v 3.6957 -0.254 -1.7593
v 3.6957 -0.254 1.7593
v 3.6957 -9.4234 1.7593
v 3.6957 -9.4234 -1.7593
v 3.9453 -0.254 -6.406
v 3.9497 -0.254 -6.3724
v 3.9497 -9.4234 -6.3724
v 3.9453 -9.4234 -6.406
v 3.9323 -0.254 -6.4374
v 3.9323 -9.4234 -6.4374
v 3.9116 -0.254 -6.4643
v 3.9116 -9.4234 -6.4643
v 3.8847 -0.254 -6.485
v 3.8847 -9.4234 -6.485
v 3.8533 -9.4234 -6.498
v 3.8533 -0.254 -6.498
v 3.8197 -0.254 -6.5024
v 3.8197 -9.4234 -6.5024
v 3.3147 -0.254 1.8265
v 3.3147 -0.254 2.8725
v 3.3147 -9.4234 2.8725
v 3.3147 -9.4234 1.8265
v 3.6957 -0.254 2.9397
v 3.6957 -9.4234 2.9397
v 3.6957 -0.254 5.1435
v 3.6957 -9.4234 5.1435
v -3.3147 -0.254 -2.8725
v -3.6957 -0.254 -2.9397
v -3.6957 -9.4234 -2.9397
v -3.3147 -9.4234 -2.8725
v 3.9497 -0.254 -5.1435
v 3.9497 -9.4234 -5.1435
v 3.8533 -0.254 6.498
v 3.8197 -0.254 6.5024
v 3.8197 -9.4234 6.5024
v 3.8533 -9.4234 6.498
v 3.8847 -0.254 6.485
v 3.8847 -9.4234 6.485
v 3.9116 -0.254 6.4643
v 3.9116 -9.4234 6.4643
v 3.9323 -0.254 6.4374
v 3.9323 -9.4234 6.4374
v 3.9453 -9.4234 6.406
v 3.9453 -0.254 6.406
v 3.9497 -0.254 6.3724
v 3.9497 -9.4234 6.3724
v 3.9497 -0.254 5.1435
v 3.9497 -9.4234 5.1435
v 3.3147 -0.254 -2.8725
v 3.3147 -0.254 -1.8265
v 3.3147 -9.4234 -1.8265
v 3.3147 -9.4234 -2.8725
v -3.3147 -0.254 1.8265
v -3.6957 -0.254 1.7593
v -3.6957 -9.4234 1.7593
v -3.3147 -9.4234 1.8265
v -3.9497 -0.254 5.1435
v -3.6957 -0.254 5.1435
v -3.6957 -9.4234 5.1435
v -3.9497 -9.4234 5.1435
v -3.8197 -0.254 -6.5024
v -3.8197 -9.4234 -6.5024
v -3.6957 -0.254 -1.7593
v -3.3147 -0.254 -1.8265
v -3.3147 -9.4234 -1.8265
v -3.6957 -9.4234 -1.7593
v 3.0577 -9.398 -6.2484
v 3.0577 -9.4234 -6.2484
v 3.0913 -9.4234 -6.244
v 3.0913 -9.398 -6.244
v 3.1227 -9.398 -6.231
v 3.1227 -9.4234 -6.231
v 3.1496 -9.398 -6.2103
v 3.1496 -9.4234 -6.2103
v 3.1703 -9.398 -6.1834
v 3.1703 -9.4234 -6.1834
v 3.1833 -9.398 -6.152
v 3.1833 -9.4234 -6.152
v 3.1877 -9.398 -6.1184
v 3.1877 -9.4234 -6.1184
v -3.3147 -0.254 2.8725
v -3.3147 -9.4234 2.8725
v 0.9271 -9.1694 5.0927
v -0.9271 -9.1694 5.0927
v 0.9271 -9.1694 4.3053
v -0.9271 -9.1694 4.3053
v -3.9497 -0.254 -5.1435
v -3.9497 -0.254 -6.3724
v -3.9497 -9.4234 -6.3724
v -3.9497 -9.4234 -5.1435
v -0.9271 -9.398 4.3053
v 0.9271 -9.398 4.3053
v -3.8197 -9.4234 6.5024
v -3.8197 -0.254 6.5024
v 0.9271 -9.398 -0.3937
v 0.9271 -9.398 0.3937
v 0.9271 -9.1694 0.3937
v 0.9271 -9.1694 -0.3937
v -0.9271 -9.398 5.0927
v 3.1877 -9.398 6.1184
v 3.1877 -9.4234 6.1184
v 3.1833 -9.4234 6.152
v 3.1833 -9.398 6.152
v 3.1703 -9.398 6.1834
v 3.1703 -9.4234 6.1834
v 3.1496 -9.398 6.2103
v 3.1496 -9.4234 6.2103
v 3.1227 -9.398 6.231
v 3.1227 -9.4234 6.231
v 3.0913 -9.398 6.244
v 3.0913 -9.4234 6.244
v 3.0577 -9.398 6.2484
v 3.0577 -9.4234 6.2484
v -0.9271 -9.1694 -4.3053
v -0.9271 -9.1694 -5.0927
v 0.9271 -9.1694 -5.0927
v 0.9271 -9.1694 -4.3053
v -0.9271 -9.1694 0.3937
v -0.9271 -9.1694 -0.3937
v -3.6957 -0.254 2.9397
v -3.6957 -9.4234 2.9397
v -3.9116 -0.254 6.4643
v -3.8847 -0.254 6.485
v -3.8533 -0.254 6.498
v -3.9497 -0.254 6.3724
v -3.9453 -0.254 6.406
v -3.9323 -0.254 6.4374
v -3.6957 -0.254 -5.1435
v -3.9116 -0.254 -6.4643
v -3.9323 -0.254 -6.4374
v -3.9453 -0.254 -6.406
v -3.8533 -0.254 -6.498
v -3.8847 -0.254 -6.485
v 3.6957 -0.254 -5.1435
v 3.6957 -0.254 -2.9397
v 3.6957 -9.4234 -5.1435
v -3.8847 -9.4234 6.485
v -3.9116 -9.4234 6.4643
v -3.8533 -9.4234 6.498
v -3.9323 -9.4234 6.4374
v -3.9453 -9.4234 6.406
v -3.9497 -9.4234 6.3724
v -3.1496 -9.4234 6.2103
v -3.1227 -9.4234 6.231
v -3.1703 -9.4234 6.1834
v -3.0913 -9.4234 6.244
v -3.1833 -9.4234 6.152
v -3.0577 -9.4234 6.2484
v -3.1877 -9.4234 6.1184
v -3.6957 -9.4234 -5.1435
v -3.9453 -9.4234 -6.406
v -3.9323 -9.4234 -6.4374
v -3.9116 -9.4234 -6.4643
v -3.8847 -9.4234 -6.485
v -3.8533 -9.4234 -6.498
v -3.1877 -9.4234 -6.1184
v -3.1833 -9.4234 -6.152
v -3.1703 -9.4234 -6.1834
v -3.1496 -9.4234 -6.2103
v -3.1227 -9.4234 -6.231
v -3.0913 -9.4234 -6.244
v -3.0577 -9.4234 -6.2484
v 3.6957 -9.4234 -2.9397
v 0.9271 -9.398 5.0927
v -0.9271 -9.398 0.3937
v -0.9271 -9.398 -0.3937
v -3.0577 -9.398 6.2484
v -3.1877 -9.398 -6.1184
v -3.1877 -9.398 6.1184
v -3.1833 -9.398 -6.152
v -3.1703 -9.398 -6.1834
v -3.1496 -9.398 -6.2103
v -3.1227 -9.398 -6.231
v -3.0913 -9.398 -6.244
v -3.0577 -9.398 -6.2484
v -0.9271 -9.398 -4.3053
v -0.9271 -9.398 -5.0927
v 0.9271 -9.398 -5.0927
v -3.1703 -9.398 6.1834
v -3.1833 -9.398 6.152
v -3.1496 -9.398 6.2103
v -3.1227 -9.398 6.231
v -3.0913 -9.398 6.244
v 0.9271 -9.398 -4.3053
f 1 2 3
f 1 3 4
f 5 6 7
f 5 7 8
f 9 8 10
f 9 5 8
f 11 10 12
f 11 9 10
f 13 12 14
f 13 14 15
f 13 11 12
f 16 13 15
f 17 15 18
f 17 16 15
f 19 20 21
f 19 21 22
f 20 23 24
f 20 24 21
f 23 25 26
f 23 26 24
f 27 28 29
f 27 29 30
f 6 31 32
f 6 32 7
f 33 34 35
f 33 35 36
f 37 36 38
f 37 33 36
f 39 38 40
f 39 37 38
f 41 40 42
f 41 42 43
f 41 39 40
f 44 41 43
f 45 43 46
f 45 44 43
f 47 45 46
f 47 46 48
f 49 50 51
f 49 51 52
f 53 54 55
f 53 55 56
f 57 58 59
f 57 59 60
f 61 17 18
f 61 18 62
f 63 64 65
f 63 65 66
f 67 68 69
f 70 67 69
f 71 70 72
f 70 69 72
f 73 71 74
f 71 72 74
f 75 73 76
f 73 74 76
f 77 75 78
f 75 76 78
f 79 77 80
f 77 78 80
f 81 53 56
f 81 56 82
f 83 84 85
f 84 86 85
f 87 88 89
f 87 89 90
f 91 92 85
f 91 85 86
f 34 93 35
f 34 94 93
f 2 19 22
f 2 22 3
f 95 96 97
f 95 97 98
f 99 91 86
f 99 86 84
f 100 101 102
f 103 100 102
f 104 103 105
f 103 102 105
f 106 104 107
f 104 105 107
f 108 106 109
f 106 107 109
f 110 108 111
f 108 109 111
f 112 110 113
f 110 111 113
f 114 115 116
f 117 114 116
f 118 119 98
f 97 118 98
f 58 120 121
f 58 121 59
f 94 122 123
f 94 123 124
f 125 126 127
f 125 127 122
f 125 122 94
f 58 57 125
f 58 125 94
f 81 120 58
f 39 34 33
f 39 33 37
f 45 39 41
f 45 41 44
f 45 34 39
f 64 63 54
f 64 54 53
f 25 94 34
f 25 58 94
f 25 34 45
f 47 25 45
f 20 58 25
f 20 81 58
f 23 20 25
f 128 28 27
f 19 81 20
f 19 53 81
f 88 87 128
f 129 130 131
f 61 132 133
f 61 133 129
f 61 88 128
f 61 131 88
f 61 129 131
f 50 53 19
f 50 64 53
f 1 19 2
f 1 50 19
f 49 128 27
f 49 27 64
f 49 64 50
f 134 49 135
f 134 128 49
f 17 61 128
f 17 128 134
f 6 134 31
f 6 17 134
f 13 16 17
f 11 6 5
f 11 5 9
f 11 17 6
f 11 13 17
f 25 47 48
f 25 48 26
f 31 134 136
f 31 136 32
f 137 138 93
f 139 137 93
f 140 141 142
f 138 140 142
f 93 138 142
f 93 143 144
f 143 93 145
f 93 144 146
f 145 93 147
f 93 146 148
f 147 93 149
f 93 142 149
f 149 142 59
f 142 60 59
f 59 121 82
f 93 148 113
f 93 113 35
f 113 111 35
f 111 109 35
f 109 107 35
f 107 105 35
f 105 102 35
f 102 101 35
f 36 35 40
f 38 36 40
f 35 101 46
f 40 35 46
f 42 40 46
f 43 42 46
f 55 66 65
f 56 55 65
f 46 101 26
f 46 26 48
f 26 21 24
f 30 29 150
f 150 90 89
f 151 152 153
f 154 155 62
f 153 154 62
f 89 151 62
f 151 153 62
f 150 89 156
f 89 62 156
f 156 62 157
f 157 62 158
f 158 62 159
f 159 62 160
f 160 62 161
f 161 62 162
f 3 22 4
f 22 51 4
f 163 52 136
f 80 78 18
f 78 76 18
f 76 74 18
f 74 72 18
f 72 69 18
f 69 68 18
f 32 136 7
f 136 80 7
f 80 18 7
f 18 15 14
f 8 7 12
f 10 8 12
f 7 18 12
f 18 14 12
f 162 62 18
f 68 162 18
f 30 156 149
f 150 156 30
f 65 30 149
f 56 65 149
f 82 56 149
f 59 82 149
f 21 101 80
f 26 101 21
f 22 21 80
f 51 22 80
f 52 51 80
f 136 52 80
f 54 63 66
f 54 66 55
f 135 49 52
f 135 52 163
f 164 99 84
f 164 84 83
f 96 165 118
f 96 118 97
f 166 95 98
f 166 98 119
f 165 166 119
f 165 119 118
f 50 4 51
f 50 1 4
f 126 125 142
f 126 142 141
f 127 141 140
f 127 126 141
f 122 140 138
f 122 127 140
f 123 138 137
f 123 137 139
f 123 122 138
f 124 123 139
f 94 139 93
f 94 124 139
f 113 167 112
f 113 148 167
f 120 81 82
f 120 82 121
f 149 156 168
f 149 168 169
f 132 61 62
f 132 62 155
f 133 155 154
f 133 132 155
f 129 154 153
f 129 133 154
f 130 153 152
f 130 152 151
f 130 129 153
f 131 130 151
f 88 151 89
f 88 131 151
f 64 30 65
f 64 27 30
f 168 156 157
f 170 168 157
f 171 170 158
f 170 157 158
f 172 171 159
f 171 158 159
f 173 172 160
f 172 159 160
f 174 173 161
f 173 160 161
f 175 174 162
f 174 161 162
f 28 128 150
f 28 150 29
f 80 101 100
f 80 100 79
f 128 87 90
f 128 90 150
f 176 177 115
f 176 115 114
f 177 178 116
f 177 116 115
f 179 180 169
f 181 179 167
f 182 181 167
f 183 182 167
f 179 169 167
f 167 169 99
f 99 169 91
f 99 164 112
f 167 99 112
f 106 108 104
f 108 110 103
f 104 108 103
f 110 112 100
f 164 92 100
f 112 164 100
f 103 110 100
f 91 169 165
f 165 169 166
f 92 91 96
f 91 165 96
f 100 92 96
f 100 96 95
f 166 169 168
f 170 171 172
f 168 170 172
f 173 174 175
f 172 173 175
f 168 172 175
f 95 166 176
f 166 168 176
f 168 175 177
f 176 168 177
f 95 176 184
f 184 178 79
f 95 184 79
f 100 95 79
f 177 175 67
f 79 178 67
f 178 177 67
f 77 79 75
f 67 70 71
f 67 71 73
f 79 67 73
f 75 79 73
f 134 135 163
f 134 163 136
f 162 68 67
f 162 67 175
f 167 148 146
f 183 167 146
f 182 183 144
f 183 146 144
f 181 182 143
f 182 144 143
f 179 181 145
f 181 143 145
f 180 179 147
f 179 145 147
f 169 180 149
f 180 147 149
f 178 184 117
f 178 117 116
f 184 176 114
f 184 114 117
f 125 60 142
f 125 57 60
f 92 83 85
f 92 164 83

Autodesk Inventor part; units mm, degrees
sketch "Sketch_2" plane through (0, -0.254, 0) normal (0, 1, 0) x (1, 0, 0)
  line L0 (-3.9497, -5.1435) -> (-3.9497, -6.3724)
  arc A0 (-3.9497, -6.3724) -> (-3.8197, -6.5024) centre (-3.8197, -6.3724) ccw
  line L1 (-3.8197, -6.5024) -> (3.8197, -6.5024)
  arc A1 (3.8197, -6.5024) -> (3.9497, -6.3724) centre (3.8197, -6.3724) ccw
  line L2 (3.9497, -6.3724) -> (3.9497, -5.1435)
  line L3 (3.9497, -5.1435) -> (3.6957, -5.1435)
  line L4 (3.6957, -5.1435) -> (3.6957, -2.9397)
  line L5 (3.6957, -2.9397) -> (3.3147, -2.8725)
  line L6 (3.3147, -2.8725) -> (3.3147, -1.8265)
  line L7 (3.3147, -1.8265) -> (3.6957, -1.7593)
  line L8 (3.6957, -1.7593) -> (3.6957, 1.7593)
  line L9 (3.6957, 1.7593) -> (3.3147, 1.8265)
  line L10 (3.3147, 1.8265) -> (3.3147, 2.8725)
  line L11 (3.3147, 2.8725) -> (3.6957, 2.9397)
  line L12 (3.6957, 2.9397) -> (3.6957, 5.1435)
  line L13 (3.6957, 5.1435) -> (3.9497, 5.1435)
  line L14 (3.9497, 5.1435) -> (3.9497, 6.3724)
  arc A2 (3.9497, 6.3724) -> (3.8197, 6.5024) centre (3.8197, 6.3724) ccw
  line L15 (3.8197, 6.5024) -> (-3.8197, 6.5024)
  arc A3 (-3.8197, 6.5024) -> (-3.9497, 6.3724) centre (-3.8197, 6.3724) ccw
  line L16 (-3.9497, 6.3724) -> (-3.9497, 5.1435)
  line L17 (-3.9497, 5.1435) -> (-3.6957, 5.1435)
  line L18 (-3.6957, 5.1435) -> (-3.6957, 2.9397)
  line L19 (-3.6957, 2.9397) -> (-3.3147, 2.8725)
  line L20 (-3.3147, 2.8725) -> (-3.3147, 1.8265)
  line L21 (-3.3147, 1.8265) -> (-3.6957, 1.7593)
  line L22 (-3.6957, 1.7593) -> (-3.6957, -1.7593)
  line L23 (-3.6957, -1.7593) -> (-3.3147, -1.8265)
  line L24 (-3.3147, -1.8265) -> (-3.3147, -2.8725)
  line L25 (-3.3147, -2.8725) -> (-3.6957, -2.9397)
  line L26 (-3.6957, -2.9397) -> (-3.6957, -5.1435)
  line L27 (-3.6957, -5.1435) -> (-3.9497, -5.1435)
extrude "Extrusion1" add sketch "Sketch_2" against normal blind 9.1694
sketch "Sketch_1" plane through (0, -9.4234, 0) normal (0, 1, 0) x (1, 0, 0)
  line L0 (-3.1877, 6.1184) -> (-3.1877, -6.1184)
  arc A0 (-3.1877, -6.1184) -> (-3.0577, -6.2484) centre (-3.0577, -6.1184) ccw
  line L1 (-3.0577, -6.2484) -> (3.0577, -6.2484)
  arc A1 (3.0577, -6.2484) -> (3.1877, -6.1184) centre (3.0577, -6.1184) ccw
  line L2 (3.1877, -6.1184) -> (3.1877, 6.1184)
  arc A2 (3.1877, 6.1184) -> (3.0577, 6.2484) centre (3.0577, 6.1184) ccw
  line L3 (3.0577, 6.2484) -> (-3.0577, 6.2484)
  arc A3 (-3.0577, 6.2484) -> (-3.1877, 6.1184) centre (-3.0577, 6.1184) ccw
extrude "Extrusion2" cut sketch "Sketch_1" along normal blind 0.0254
sketch "Sketch_7" plane through (0, -9.4234, 0) normal (0, 1, 0) x (1, 0, 0)
  line L0 (-0.9271, 5.0927) -> (-0.9271, 4.3053)
  line L1 (-0.9271, 4.3053) -> (0.9271, 4.3053)
  line L2 (0.9271, 4.3053) -> (0.9271, 5.0927)
  line L3 (0.9271, 5.0927) -> (-0.9271, 5.0927)
extrude "Extrusion3" cut sketch "Sketch_7" along normal blind 0.254
pattern_linear "Rectangular Pattern1" count 3 spacing 4.699 along (0, 0, 1) of "Extrusion3"
ref_plane "rot_XY" through (0, 6.6675, 0) normal (1, 0, 0) x (0, 0, -1)
ref_plane "rot_YZ" through (0, 6.6675, 0) normal (0, 0, -1) x (0, 1, 0)
ref_plane "rot_ZX" through (0, 6.6675, 0) normal (0, 1, 0) x (1, 0, 0)
ref_plane "to_cover_XY" through (0, -0.254, 0) normal (0, 1, 0) x (1, 0, 0)
ref_plane "to_cover_YZ" through (0, -0.254, 0) normal (1, 0, 0) x (0, 0, -1)
ref_plane "to_cover_ZX" through (0, -0.254, 0) normal (0, 0, -1) x (0, 1, 0)
ref_plane "to_terminals_XY" through (0, -9.4234, 0) normal (0, 1, 0) x (1, 0, 0)
ref_plane "to_terminals_YZ" through (0, -9.4234, 0) normal (1, 0, 0) x (0, 0, -1)
ref_plane "to_terminals_ZX" through (0, -9.4234, 0) normal (0, 0, -1) x (0, 1, 0)
properties part number "M20121SA2W13BR-switch"
